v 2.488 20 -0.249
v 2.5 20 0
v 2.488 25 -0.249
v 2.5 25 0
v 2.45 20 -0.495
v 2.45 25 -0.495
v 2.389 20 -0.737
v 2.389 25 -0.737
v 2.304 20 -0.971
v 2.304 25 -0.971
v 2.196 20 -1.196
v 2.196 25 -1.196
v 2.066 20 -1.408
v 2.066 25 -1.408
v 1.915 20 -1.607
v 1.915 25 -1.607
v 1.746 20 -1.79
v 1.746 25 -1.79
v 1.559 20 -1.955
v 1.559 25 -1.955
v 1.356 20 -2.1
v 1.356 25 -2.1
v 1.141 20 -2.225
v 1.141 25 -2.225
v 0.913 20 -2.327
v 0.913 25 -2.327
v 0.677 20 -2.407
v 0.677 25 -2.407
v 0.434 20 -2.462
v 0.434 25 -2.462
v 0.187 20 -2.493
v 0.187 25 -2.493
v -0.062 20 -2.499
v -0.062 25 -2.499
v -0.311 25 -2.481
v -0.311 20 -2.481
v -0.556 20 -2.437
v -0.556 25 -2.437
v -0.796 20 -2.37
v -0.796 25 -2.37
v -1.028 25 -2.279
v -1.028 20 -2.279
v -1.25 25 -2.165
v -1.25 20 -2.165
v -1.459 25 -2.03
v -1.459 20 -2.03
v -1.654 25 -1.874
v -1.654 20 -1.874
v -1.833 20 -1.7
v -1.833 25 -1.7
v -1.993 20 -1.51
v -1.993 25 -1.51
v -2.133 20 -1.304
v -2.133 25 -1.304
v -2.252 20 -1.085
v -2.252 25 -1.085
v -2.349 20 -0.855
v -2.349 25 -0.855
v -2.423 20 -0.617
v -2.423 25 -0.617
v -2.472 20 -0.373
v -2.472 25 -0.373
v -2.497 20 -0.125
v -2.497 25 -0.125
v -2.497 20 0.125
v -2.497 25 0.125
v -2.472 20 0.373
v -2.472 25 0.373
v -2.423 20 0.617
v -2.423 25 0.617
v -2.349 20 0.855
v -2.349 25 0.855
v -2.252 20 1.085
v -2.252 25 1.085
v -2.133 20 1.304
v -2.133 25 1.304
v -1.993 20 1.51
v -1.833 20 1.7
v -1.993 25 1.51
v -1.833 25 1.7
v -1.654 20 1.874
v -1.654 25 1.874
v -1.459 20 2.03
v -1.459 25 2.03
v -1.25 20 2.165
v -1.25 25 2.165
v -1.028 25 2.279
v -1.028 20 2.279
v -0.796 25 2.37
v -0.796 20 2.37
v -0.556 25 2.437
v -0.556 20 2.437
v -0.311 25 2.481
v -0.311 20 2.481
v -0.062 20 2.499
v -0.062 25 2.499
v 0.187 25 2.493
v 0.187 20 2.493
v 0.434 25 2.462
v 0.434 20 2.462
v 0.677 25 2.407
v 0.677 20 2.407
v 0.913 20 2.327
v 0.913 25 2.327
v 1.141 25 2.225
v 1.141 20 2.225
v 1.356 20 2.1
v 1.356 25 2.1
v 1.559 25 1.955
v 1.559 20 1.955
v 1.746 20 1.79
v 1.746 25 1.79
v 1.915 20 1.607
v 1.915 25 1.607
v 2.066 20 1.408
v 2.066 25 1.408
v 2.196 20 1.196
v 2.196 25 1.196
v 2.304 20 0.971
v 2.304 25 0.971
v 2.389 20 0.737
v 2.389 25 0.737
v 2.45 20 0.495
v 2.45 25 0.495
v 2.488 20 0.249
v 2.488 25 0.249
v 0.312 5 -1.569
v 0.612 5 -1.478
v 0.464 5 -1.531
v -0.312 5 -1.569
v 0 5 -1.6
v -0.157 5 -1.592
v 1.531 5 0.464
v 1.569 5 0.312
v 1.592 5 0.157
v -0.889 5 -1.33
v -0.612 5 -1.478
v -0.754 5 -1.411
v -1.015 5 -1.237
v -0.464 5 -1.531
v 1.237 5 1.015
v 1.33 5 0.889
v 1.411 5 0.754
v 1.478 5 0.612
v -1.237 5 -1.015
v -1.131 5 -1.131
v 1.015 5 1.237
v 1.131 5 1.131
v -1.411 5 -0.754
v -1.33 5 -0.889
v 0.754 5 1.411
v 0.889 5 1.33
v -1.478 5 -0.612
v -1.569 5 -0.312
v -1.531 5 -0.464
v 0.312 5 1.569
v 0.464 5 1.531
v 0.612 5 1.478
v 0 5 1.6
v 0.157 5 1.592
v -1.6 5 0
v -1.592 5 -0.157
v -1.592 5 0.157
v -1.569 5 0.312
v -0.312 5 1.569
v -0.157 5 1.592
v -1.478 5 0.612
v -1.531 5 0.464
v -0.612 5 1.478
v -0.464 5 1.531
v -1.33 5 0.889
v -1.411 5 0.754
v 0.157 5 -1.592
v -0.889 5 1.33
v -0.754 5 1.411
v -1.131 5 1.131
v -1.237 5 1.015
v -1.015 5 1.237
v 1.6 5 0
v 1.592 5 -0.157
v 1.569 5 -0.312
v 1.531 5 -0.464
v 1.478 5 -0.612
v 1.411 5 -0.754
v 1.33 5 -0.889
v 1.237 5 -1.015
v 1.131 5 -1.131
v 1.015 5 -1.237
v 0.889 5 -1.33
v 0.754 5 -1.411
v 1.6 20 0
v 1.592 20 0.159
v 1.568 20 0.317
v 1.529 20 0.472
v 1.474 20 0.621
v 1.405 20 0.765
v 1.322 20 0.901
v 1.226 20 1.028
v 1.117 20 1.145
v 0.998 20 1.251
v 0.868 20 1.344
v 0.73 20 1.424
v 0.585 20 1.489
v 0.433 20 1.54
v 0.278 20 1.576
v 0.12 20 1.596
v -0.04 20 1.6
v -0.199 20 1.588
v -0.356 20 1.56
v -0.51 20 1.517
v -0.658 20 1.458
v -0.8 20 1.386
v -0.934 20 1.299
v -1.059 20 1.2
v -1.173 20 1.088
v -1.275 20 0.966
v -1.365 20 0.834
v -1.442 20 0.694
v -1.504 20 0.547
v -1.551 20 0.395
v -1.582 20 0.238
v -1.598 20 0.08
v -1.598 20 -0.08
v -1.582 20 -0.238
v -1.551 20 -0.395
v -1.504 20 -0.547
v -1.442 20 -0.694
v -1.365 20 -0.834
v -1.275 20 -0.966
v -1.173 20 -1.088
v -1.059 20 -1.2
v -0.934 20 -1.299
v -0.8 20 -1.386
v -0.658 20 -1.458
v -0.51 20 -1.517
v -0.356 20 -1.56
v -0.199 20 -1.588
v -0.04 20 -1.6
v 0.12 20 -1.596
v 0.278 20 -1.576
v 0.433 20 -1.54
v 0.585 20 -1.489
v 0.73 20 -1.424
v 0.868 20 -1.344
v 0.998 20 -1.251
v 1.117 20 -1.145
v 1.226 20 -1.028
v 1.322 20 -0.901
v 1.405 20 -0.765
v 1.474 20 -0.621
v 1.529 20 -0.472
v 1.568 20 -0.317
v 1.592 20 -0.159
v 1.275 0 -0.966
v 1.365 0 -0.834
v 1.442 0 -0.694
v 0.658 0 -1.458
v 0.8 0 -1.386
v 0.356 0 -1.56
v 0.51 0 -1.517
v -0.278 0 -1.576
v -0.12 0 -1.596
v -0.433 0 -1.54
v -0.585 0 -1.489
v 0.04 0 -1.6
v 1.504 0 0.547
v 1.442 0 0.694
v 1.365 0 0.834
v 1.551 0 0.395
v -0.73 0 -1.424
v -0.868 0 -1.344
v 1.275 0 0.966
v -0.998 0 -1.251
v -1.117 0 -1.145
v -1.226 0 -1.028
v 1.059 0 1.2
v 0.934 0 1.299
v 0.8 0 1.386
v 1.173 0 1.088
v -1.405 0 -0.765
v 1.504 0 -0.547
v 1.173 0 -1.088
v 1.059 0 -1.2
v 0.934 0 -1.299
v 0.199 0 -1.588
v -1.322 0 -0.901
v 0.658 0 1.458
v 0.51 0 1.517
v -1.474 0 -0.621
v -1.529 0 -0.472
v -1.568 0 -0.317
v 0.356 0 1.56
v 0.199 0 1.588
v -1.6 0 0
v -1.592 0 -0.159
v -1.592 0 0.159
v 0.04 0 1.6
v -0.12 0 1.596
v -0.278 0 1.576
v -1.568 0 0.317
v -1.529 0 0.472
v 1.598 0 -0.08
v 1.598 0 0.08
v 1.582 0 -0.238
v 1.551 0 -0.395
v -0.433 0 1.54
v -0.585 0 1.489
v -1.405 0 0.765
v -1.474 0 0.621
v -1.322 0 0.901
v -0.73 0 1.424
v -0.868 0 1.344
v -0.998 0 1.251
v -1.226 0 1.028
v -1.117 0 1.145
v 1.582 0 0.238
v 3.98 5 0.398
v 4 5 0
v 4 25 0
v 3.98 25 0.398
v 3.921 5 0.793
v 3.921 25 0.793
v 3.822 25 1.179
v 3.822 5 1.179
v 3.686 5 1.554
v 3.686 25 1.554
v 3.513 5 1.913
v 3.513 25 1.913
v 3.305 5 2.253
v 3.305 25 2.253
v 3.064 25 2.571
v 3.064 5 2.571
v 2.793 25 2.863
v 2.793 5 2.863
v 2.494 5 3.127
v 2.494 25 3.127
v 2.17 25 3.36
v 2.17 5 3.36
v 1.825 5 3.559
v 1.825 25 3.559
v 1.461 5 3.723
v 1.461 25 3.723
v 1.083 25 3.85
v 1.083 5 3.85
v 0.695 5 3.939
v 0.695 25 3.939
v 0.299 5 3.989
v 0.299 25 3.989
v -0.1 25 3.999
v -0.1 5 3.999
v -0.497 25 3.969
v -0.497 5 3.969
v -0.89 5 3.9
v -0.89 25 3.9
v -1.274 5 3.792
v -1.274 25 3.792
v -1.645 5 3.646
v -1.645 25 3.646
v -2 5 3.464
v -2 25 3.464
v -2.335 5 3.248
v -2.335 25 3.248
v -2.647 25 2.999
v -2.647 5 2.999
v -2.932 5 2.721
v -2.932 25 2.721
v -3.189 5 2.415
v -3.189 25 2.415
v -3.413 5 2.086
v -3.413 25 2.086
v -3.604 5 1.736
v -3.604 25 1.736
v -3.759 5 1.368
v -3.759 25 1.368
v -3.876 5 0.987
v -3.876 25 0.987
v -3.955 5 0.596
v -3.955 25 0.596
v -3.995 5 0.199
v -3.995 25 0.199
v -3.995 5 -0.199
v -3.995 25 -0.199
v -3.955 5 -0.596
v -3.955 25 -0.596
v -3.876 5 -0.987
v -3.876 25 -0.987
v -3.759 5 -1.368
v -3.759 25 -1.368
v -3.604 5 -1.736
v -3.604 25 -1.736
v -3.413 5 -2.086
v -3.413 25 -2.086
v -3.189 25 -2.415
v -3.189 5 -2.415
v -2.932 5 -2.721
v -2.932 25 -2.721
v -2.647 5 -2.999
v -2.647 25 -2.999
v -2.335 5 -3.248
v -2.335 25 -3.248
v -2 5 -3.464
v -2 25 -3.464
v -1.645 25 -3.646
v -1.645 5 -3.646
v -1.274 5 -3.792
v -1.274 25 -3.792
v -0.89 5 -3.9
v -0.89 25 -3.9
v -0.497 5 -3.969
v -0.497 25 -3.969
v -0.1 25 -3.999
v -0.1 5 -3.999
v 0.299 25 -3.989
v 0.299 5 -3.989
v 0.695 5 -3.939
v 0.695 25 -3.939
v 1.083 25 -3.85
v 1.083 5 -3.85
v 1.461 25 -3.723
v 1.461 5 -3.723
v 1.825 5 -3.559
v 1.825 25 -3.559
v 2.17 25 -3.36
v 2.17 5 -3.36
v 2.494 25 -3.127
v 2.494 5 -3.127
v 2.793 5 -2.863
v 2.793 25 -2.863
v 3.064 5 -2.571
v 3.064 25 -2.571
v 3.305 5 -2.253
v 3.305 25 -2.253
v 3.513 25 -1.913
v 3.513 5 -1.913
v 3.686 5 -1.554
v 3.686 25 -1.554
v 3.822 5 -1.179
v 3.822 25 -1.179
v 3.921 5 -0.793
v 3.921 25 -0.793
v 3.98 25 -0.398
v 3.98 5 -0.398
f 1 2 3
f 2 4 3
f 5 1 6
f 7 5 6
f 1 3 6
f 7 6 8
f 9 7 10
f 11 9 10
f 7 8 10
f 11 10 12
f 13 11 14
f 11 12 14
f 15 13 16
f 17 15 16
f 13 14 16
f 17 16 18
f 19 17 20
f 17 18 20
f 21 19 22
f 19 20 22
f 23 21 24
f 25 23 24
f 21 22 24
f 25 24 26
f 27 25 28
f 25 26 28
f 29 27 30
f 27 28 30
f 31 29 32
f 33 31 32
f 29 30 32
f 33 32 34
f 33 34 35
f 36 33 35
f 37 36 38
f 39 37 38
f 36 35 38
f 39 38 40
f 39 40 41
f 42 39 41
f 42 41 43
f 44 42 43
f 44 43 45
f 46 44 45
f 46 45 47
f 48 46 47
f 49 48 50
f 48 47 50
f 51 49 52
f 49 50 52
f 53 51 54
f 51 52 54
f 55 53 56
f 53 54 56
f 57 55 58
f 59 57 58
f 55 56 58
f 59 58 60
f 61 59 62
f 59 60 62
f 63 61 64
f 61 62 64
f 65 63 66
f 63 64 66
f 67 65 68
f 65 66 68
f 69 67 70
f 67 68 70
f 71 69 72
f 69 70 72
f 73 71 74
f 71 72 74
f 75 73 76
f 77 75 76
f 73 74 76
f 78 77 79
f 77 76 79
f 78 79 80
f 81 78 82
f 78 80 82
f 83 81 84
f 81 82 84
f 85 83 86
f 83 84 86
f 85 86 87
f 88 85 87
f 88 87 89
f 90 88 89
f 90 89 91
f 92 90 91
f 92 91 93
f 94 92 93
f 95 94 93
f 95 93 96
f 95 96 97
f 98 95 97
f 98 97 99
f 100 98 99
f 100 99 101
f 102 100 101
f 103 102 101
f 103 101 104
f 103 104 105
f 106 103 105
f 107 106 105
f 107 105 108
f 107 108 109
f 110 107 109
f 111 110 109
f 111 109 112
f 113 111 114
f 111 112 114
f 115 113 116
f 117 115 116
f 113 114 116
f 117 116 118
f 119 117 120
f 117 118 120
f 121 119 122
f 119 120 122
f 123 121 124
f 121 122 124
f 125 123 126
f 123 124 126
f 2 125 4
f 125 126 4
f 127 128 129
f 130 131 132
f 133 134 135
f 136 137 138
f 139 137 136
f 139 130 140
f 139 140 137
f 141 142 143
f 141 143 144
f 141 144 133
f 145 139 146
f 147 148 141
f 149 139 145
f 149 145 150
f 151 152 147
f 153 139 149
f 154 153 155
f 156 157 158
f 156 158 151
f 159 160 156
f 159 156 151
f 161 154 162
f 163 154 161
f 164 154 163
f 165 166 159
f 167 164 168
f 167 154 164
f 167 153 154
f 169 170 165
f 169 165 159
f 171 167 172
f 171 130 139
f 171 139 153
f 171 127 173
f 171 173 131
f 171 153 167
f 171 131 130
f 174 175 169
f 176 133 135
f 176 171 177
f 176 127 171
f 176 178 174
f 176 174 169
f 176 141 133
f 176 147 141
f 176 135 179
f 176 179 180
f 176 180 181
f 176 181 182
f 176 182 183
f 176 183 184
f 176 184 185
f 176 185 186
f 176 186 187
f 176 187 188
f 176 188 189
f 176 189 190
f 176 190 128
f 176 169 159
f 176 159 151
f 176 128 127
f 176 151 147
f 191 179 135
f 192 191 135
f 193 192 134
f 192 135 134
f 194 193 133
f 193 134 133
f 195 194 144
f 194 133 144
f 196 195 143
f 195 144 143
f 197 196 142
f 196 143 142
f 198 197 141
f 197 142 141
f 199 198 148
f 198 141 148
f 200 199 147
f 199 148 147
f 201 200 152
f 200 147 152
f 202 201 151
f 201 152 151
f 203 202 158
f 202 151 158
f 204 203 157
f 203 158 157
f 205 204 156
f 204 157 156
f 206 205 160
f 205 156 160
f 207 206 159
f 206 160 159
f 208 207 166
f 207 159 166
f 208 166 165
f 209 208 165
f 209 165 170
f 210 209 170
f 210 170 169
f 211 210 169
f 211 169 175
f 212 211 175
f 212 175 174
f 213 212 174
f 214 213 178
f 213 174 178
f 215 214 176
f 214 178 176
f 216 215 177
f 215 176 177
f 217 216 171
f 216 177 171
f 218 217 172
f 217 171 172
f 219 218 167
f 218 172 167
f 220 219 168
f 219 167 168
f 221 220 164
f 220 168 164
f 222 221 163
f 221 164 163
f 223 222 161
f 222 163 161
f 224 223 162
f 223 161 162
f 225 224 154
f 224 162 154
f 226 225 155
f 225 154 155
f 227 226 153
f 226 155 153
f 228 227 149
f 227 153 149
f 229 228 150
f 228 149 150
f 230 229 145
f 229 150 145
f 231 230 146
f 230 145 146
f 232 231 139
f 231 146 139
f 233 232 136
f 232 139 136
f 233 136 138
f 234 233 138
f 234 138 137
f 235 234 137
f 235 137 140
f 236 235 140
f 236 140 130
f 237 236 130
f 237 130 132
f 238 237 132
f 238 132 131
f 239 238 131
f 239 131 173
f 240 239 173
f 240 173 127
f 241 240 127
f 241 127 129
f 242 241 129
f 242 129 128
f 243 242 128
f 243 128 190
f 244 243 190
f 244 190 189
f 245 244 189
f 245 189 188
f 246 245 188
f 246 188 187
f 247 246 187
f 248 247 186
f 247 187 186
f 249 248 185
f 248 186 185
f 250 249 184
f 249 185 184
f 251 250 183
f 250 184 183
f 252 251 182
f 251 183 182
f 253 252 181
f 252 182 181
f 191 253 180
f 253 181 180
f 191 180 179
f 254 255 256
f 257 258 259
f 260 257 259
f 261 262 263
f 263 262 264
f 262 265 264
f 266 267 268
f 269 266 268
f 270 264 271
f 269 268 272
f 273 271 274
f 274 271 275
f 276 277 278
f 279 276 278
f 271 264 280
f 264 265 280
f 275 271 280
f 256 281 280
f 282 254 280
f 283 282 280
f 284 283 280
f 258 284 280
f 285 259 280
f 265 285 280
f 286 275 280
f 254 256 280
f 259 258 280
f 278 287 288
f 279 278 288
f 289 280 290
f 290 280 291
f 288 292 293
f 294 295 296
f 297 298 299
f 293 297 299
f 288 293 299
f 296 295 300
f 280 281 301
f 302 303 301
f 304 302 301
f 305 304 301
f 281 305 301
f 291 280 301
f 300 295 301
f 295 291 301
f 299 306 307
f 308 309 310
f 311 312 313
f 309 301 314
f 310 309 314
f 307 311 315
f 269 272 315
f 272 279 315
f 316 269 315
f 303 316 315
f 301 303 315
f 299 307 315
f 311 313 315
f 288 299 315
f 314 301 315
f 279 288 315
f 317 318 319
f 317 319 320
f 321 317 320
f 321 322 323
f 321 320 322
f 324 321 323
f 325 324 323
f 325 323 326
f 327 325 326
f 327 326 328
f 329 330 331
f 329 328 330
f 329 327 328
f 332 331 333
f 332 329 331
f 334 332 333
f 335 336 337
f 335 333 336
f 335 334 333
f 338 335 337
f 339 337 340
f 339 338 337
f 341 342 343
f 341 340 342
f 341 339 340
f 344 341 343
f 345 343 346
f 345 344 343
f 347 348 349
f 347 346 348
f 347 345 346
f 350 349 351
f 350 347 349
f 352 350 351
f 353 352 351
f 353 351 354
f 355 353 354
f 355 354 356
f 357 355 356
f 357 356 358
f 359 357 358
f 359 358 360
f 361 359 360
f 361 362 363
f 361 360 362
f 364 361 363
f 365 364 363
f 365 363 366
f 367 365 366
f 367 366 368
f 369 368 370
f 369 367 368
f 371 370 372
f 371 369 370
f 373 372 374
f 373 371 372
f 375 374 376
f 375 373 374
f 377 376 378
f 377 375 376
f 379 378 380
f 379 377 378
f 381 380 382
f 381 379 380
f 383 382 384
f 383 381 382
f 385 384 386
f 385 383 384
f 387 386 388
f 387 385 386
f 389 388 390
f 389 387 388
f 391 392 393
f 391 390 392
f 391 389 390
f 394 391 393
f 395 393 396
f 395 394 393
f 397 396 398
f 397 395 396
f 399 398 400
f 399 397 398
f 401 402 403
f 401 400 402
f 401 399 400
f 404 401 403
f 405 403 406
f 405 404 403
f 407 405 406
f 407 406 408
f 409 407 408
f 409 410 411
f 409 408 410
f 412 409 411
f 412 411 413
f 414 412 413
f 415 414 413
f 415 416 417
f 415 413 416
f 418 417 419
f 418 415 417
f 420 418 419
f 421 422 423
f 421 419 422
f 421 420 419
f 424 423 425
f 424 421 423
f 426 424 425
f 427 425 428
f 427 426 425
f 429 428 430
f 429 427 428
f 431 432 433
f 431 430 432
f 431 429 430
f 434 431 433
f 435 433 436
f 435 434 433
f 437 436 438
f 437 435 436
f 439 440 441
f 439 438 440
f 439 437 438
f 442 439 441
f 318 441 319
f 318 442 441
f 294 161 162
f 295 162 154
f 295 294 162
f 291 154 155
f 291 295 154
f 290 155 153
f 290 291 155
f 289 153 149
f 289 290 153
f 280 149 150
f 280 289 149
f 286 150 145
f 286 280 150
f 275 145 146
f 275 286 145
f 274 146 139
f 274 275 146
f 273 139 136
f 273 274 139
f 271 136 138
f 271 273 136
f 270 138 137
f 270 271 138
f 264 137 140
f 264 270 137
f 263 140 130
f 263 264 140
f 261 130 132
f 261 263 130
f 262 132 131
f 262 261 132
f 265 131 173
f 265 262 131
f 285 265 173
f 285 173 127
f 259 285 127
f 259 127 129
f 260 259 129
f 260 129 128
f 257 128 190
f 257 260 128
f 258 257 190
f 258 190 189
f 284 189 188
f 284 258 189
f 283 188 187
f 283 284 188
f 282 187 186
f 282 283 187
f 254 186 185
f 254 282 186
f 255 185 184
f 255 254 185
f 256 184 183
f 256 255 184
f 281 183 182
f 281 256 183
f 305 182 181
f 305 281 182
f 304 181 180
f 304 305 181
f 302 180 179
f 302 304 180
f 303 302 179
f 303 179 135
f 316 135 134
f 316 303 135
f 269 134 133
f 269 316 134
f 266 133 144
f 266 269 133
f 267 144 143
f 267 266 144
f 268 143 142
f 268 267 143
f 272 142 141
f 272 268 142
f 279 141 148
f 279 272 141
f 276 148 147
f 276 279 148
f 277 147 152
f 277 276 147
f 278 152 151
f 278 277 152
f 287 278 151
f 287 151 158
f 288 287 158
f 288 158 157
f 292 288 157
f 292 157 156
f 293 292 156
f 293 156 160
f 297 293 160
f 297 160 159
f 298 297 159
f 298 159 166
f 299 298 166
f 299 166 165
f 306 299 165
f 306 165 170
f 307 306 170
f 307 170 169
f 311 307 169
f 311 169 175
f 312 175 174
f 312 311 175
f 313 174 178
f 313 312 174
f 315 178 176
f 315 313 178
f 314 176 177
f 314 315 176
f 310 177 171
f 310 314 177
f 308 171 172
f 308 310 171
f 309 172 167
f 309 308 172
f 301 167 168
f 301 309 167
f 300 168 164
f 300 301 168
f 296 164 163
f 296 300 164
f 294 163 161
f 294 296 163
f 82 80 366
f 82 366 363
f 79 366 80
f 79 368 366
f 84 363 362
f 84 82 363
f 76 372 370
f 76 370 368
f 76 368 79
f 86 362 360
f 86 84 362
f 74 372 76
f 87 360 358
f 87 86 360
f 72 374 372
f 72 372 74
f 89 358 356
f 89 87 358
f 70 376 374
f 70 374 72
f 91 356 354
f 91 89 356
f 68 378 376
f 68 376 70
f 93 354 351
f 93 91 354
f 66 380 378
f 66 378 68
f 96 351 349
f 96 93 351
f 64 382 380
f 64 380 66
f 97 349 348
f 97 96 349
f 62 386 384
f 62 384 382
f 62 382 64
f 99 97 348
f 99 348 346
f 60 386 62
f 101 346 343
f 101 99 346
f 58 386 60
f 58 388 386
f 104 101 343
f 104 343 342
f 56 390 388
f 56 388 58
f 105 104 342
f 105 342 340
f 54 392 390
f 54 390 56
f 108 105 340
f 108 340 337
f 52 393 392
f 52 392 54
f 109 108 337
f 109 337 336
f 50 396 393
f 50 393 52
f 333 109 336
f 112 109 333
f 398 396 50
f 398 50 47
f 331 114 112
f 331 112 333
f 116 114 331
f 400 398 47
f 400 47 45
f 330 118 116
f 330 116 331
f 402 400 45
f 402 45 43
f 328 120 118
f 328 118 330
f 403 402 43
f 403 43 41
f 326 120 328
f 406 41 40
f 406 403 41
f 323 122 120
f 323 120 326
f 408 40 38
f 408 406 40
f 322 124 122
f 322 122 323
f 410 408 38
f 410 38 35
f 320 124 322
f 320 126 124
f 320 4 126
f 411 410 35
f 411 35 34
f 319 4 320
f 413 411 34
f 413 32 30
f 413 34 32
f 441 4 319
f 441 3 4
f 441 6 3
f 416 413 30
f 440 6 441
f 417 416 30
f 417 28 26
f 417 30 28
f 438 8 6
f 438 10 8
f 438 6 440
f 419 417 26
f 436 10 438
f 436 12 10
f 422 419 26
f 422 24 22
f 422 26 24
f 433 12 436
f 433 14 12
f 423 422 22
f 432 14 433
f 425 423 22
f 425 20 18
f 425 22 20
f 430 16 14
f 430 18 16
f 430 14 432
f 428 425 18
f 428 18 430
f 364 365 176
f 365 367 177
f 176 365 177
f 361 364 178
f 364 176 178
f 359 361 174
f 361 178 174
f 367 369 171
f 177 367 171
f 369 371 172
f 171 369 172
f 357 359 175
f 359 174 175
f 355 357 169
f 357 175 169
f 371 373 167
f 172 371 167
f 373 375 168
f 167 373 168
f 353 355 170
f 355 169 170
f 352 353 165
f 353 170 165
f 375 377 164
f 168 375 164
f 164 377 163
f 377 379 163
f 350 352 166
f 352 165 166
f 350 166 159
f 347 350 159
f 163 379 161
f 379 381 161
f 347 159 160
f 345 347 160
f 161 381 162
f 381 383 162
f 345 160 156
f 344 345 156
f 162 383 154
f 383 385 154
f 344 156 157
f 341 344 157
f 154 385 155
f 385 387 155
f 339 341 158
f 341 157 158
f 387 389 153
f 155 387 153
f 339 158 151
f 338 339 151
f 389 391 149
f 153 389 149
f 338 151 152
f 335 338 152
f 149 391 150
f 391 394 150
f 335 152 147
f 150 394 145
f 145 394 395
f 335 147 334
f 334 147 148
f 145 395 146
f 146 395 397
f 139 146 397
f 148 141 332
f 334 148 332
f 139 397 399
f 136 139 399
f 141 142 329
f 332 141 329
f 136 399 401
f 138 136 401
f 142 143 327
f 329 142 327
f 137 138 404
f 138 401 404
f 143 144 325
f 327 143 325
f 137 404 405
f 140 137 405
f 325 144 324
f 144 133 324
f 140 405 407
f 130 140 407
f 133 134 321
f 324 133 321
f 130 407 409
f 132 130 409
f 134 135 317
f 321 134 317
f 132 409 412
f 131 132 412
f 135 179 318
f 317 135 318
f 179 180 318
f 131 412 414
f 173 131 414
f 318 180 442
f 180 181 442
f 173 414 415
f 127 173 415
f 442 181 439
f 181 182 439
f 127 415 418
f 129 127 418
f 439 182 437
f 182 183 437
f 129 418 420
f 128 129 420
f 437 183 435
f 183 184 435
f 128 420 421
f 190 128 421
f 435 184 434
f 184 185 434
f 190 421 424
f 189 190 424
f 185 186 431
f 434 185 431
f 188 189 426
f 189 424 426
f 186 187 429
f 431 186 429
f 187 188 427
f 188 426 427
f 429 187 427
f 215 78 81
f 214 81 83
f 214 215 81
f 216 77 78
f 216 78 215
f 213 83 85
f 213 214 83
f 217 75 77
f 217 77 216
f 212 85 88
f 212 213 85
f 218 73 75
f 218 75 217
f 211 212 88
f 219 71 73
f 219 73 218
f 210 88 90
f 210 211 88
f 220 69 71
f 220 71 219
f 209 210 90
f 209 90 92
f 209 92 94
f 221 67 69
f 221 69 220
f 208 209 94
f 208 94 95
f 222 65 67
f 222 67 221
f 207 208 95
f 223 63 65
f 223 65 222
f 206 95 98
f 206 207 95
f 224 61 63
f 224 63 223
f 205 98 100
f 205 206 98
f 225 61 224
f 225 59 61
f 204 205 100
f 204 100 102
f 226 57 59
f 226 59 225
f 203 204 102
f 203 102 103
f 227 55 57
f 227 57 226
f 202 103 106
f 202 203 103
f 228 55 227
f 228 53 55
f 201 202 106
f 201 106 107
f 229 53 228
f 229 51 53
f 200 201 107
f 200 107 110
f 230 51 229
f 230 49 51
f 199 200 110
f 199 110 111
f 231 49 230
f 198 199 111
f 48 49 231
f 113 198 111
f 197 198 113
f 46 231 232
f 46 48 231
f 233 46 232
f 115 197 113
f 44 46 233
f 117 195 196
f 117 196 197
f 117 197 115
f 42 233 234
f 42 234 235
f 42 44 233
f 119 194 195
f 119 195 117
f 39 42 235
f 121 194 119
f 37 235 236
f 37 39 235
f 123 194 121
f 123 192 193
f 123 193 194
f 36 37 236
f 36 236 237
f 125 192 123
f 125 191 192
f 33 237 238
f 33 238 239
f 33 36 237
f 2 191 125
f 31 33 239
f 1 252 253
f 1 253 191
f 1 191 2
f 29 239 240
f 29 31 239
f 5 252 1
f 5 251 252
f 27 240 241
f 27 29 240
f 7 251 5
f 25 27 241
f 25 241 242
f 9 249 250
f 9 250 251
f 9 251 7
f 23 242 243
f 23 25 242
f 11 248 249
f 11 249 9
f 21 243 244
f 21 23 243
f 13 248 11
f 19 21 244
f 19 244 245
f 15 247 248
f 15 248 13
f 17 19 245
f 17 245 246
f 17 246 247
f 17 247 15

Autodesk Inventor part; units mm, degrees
ref_plane "YZ Plane" through (0, 0, 0) normal (1, 0, 0) x (0, 1, 0)
ref_plane "XZ Plane" through (0, 0, 0) normal (0, 1, 0) x (-1, 0, 0)
ref_plane "XY Plane" through (0, 0, 0) normal (0, 0, 1) x (1, 0, 0)
sketch "Sketch1" plane through (0, 0, 0) normal (0, 1, 0) x (-1, 0, 0)
  circle A0 centre (0, 0) radius 1.6
  dimension "d0" = 3.2
extrude "Extrusion1" add sketch "Sketch1" along normal blind 5
sketch "Sketch2" plane through (0, 5, 0) normal (0, 1, 0) x (1, 0, 0)
  circle A0 centre (0, 0) radius 1.6 projected
  circle A1 centre (0, 0) radius 4
  dimension "d3" = 8
extrude "Extrusion2" add sketch "Sketch2" along normal blind 20
sketch "Sketch3" plane through (0, 25, 0) normal (0, 1, 0) x (1, 0, 0)
  circle A0 centre (0, 0) radius 2.5
  dimension "d6" = 5
extrude "Extrusion3" cut sketch "Sketch3" against normal blind 5
properties part number "MountPin_test"
